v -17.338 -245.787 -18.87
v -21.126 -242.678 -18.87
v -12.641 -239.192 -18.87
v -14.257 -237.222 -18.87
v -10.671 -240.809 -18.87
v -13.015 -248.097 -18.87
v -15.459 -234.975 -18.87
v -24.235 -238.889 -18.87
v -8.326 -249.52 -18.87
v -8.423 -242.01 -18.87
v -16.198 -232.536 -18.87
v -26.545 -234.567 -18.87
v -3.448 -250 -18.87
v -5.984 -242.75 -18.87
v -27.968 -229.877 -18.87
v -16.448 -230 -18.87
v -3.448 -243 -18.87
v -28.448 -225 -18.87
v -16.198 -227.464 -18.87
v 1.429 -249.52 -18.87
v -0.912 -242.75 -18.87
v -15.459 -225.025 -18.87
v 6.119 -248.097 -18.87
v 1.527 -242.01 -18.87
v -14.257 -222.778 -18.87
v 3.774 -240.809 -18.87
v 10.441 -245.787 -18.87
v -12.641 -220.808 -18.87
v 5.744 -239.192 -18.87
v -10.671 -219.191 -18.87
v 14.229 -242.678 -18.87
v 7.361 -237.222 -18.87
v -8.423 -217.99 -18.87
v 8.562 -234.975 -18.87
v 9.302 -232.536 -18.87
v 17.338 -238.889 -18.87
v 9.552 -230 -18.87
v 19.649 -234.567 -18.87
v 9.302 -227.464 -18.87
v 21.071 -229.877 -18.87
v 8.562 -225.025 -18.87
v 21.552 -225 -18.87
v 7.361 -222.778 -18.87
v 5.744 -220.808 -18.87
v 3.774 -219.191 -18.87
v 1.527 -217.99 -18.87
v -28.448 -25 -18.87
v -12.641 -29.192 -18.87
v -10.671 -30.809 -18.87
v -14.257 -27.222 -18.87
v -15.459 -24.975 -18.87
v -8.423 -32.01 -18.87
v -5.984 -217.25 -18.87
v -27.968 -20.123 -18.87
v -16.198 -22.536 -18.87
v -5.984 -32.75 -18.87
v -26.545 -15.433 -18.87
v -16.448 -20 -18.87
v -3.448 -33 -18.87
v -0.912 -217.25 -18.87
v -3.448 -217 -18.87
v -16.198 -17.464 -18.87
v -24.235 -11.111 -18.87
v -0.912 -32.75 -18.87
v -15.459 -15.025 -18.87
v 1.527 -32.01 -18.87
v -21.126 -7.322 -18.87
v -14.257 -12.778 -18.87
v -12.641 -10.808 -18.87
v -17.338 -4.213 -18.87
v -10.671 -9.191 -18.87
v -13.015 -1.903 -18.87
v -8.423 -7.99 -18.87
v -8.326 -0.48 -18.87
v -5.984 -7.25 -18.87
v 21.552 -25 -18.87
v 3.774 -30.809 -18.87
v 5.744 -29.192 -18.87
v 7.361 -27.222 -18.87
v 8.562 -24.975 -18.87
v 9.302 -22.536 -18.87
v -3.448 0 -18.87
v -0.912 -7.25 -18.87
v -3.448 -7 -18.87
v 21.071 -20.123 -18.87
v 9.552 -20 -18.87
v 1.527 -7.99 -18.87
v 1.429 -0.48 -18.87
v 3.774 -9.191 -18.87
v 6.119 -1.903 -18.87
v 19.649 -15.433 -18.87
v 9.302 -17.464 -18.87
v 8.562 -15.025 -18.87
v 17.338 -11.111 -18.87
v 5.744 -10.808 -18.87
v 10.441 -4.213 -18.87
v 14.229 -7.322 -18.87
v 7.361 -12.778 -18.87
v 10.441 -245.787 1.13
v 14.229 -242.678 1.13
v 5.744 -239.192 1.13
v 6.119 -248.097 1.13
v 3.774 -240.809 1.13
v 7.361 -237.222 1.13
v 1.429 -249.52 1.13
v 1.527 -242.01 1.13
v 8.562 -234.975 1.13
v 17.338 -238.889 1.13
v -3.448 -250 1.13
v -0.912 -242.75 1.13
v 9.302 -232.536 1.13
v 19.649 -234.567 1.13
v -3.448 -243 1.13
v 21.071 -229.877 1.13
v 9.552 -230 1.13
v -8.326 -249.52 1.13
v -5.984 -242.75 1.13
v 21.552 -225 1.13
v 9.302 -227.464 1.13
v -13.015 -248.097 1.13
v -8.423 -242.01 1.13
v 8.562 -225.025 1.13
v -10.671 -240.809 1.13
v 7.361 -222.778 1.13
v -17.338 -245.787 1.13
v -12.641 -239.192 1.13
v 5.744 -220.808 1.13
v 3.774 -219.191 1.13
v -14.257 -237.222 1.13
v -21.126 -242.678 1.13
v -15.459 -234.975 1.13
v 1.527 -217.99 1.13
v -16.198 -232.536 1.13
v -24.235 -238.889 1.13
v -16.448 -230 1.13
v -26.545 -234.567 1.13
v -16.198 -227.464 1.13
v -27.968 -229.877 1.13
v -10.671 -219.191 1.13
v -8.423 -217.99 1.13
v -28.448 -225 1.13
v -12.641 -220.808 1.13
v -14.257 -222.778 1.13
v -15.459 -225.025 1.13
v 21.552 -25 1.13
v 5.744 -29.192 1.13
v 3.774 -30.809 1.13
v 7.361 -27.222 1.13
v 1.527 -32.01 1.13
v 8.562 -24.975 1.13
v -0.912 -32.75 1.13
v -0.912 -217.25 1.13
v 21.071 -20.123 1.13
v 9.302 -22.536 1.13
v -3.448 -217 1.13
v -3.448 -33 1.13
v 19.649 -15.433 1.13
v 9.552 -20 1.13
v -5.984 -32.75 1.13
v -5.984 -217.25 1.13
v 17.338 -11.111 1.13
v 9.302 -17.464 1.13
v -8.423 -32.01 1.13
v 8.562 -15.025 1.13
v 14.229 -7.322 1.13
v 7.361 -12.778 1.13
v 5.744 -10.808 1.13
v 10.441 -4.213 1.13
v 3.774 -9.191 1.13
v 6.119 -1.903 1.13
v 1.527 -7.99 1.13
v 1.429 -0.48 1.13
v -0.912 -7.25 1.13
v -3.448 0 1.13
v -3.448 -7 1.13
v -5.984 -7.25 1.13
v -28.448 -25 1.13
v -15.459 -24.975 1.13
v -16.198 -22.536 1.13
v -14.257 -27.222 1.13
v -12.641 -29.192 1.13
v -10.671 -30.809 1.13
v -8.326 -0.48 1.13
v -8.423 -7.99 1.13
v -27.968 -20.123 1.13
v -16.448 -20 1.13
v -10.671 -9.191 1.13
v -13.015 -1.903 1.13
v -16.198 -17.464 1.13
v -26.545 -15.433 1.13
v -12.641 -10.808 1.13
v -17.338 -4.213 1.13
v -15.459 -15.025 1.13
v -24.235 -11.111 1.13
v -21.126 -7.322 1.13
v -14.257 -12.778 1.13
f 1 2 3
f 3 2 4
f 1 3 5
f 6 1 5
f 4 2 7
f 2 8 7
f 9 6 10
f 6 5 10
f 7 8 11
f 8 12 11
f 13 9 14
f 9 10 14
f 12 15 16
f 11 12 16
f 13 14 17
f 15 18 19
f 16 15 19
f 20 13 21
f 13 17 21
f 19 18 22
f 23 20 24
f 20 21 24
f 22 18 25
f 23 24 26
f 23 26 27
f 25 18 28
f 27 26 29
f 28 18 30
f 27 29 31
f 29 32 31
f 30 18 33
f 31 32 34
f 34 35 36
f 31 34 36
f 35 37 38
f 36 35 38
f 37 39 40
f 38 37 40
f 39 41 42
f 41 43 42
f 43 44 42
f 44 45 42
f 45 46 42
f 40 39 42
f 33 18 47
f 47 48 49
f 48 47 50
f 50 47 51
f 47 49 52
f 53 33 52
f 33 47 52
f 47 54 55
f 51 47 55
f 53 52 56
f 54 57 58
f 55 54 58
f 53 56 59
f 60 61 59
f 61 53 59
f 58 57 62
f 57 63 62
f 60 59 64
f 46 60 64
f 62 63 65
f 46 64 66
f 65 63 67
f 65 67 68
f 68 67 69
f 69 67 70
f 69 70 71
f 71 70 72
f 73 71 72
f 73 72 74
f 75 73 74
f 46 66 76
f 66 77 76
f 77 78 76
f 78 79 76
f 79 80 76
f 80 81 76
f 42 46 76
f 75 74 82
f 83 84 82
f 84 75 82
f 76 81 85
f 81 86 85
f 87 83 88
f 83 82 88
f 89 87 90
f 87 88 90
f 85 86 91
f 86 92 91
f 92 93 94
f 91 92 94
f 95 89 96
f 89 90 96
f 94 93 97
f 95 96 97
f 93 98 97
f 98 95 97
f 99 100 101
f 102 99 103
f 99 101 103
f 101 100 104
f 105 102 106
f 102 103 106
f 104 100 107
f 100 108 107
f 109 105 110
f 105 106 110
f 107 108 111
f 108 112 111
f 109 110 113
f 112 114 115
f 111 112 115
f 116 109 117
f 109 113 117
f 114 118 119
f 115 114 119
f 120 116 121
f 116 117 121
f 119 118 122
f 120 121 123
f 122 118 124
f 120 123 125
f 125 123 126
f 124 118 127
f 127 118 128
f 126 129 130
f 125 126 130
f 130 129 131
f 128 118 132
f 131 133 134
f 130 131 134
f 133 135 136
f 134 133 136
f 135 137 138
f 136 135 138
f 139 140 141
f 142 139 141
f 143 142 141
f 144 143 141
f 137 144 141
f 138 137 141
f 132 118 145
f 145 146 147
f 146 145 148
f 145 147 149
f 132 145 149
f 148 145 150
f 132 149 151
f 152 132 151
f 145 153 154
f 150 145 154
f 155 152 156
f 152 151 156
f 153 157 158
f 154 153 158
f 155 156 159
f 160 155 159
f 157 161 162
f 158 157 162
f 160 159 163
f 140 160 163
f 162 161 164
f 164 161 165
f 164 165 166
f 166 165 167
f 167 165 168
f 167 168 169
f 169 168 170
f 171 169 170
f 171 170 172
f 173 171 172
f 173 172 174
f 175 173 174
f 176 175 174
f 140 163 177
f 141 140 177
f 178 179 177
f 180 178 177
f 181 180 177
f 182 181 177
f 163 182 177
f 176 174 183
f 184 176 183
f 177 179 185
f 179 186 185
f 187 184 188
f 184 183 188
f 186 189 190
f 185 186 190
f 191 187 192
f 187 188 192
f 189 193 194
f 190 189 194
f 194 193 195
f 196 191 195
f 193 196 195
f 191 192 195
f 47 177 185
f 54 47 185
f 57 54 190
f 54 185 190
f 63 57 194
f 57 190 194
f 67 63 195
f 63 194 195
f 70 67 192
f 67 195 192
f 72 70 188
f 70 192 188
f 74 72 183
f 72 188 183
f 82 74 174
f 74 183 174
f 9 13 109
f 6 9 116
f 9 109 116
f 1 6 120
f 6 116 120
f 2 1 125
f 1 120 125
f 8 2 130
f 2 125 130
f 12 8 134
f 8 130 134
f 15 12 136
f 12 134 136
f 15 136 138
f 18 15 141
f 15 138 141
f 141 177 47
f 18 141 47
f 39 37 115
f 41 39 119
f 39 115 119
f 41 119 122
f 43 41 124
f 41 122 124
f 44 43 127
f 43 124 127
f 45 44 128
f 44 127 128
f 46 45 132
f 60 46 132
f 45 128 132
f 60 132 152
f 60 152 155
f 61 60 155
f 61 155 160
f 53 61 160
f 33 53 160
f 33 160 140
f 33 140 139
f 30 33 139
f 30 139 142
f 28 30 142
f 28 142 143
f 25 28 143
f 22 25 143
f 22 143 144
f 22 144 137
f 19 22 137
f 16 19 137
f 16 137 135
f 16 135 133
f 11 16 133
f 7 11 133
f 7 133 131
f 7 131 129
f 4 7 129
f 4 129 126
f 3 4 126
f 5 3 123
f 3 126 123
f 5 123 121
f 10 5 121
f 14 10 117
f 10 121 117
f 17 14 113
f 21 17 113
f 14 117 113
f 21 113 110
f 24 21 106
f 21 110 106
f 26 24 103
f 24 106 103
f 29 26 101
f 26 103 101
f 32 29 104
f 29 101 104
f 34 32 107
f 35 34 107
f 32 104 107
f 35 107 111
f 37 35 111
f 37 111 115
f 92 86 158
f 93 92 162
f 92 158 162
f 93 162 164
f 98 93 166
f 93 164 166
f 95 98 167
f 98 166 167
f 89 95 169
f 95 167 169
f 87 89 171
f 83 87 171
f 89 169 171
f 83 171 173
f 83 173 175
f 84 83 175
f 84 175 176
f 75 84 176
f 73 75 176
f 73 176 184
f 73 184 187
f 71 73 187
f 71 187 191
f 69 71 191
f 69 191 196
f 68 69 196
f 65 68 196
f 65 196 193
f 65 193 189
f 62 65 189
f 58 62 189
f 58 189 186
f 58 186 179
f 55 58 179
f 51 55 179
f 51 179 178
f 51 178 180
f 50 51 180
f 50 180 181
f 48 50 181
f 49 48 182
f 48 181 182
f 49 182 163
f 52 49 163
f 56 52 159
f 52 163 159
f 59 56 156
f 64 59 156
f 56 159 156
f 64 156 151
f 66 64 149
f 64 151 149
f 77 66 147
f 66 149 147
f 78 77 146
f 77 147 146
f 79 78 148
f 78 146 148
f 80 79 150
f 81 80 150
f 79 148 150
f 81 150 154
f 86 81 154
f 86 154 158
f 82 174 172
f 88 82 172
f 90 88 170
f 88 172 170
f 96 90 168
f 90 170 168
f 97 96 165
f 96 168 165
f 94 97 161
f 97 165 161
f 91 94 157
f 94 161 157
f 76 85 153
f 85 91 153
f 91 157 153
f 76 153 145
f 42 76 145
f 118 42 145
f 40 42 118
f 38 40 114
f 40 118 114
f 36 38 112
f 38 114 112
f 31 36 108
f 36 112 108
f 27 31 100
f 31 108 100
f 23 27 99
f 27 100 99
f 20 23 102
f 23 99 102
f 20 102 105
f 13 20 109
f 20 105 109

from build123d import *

# Parameters (mm, degrees)
F1_DEPTH = 250
F3_DEPTH = 25
F4_R     = 13
F5_DEPTH = 25


with BuildPart() as f1:
    # F0 (on Front) → F1 (new body)
    with BuildSketch(Plane.XZ):
        Polygon((-28.448276, 1.130267), (-28.448276, 0), (-28.448276, -18.869733), (21.551724, -18.869733), (21.551724, 1.130267), align=None)
    extrude(amount=F1_DEPTH)

    # F2 (on face) → F3 (cut)
    with BuildSketch(Plane.XY.offset(1.130267)):
        with BuildLine():
            Line((21.551724, 0), (-3.448276, 0))
            ThreePointArc((-3.448276, 0), (14.229393, -7.32233), (21.551724, -25))
            Line((21.551724, -25), (21.551724, 0))
        make_face()
        with BuildLine():
            Line((-28.448276, 0), (-28.448276, -25))
            ThreePointArc((-28.448276, -25), (-21.125946, -7.32233), (-3.448276, 0))
            Line((-3.448276, 0), (-28.448276, 0))
        make_face()
        with BuildLine():
            ThreePointArc((21.551724, -225), (14.229393, -242.67767), (-3.448277, -250))
            Line((-3.448277, -250), (21.551724, -250))
            Line((21.551724, -250), (21.551724, -225))
        make_face()
        with BuildLine():
            ThreePointArc((-3.448277, -250), (-21.125946, -242.677669), (-28.448276, -225))
            Line((-28.448276, -225), (-28.448276, -250))
            Line((-28.448276, -250), (-3.448277, -250))
        make_face()
    extrude(amount=-F3_DEPTH, mode=Mode.SUBTRACT)

    # F4 (on face) → F5 (cut)
    with BuildSketch(Plane.XY.offset(1.130267)):
        with Locations((-3.448276, -20)):
            Circle(F4_R)
        with Locations((-3.448276, -230)):
            Circle(F4_R)
    extrude(amount=-F5_DEPTH, mode=Mode.SUBTRACT)


solid = f1.part
